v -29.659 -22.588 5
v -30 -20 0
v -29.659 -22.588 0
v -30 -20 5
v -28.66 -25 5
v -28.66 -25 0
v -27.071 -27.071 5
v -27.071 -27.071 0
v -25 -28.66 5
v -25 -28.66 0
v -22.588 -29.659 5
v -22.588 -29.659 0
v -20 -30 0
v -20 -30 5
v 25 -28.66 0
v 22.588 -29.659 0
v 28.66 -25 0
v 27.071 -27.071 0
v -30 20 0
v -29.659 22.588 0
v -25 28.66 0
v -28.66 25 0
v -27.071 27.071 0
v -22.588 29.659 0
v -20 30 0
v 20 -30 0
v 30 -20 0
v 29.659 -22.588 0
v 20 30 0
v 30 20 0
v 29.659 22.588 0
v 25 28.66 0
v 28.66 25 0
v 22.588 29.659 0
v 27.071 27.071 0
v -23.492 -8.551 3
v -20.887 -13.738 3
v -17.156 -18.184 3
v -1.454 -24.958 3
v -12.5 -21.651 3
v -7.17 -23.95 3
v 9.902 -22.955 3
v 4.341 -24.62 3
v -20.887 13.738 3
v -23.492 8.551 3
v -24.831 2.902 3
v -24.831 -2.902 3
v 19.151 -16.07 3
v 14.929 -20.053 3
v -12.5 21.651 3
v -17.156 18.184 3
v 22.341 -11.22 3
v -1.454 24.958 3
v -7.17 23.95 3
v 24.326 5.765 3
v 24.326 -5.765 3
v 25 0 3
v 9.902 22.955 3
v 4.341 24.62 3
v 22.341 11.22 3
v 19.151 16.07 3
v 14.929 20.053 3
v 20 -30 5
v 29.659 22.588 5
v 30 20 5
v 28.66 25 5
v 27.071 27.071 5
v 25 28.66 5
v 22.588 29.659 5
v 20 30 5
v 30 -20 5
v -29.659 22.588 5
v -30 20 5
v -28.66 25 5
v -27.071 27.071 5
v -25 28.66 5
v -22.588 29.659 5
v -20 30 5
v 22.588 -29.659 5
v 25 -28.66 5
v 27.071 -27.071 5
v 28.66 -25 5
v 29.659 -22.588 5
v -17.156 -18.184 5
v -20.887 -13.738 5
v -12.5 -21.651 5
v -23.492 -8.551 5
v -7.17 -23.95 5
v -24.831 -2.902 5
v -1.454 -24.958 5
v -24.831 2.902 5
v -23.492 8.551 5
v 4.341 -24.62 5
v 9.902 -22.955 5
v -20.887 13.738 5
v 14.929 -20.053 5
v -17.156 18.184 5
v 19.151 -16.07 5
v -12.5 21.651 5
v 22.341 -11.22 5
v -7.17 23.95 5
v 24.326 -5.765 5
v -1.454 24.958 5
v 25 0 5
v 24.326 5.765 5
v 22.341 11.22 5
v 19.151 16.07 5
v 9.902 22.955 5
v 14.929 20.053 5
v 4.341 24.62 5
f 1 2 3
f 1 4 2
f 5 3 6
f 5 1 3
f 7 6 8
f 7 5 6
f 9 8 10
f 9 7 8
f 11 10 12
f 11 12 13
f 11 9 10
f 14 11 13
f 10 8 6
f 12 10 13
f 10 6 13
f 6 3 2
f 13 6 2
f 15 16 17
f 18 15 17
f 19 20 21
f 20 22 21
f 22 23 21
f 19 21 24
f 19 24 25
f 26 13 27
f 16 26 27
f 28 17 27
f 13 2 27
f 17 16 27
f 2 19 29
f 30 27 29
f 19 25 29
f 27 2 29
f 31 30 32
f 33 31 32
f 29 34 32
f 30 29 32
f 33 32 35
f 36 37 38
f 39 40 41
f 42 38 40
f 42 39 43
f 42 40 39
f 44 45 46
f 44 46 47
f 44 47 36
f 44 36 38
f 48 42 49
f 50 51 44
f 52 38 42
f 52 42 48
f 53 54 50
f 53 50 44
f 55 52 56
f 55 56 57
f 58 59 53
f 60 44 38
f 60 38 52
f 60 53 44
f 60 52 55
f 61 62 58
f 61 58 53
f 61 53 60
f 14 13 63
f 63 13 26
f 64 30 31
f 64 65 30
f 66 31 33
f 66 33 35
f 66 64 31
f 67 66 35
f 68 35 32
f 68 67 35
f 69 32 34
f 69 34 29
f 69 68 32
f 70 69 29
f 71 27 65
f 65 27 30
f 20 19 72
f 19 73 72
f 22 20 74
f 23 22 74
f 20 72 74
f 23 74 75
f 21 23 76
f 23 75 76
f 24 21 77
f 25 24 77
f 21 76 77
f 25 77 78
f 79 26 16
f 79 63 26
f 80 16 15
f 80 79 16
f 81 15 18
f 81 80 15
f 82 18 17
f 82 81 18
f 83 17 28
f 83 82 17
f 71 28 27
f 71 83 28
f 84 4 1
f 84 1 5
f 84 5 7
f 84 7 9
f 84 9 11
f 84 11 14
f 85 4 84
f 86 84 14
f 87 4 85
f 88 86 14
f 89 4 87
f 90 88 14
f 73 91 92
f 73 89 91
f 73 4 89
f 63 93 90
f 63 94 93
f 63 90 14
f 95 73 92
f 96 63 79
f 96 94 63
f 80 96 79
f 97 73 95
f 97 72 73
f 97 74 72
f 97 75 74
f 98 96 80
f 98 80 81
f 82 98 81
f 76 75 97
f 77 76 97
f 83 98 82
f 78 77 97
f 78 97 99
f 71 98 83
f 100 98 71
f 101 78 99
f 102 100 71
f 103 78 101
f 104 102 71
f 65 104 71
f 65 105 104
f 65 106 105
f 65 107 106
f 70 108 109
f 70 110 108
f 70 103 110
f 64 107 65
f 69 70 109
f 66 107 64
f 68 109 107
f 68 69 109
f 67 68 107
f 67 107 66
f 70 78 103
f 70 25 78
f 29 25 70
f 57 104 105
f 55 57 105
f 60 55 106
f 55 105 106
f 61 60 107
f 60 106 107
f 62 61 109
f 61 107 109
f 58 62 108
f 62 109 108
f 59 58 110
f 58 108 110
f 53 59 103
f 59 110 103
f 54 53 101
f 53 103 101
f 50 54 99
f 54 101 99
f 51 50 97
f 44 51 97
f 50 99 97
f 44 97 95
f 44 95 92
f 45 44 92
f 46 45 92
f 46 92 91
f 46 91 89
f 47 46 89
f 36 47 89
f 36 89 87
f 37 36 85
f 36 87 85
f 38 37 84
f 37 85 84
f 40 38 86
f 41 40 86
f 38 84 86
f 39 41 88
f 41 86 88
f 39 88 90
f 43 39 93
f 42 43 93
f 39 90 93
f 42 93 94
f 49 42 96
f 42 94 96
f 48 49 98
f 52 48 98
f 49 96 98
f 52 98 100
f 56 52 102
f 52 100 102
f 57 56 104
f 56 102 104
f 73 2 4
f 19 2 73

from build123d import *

# Parameters (mm, degrees)
F0_W     = 60
F0_H     = 60
F1_DEPTH = 5
F2_R     = 10
F3_R     = 25
F4_DEPTH = 2


with BuildPart() as f1:
    # F0 (on Top) → F1 (new body)
    with BuildSketch(Plane.XY):
        Rectangle(F0_W, F0_H)
    extrude(amount=F1_DEPTH)

    # F2
    f2_edges = [f1.edges().sort_by_distance(p)[0] for p in [
        (30, -30, 2.5),
        (30, 30, 2.5),
        (-30, -30, 2.5),
        (-30, 30, 2.5),
    ]]
    fillet(f2_edges, radius=F2_R)

    # F3 (on face) → F4 (cut)
    with BuildSketch(Plane.XY.offset(5)):
        Circle(F3_R)
    extrude(amount=-F4_DEPTH, mode=Mode.SUBTRACT)


solid = f1.part
